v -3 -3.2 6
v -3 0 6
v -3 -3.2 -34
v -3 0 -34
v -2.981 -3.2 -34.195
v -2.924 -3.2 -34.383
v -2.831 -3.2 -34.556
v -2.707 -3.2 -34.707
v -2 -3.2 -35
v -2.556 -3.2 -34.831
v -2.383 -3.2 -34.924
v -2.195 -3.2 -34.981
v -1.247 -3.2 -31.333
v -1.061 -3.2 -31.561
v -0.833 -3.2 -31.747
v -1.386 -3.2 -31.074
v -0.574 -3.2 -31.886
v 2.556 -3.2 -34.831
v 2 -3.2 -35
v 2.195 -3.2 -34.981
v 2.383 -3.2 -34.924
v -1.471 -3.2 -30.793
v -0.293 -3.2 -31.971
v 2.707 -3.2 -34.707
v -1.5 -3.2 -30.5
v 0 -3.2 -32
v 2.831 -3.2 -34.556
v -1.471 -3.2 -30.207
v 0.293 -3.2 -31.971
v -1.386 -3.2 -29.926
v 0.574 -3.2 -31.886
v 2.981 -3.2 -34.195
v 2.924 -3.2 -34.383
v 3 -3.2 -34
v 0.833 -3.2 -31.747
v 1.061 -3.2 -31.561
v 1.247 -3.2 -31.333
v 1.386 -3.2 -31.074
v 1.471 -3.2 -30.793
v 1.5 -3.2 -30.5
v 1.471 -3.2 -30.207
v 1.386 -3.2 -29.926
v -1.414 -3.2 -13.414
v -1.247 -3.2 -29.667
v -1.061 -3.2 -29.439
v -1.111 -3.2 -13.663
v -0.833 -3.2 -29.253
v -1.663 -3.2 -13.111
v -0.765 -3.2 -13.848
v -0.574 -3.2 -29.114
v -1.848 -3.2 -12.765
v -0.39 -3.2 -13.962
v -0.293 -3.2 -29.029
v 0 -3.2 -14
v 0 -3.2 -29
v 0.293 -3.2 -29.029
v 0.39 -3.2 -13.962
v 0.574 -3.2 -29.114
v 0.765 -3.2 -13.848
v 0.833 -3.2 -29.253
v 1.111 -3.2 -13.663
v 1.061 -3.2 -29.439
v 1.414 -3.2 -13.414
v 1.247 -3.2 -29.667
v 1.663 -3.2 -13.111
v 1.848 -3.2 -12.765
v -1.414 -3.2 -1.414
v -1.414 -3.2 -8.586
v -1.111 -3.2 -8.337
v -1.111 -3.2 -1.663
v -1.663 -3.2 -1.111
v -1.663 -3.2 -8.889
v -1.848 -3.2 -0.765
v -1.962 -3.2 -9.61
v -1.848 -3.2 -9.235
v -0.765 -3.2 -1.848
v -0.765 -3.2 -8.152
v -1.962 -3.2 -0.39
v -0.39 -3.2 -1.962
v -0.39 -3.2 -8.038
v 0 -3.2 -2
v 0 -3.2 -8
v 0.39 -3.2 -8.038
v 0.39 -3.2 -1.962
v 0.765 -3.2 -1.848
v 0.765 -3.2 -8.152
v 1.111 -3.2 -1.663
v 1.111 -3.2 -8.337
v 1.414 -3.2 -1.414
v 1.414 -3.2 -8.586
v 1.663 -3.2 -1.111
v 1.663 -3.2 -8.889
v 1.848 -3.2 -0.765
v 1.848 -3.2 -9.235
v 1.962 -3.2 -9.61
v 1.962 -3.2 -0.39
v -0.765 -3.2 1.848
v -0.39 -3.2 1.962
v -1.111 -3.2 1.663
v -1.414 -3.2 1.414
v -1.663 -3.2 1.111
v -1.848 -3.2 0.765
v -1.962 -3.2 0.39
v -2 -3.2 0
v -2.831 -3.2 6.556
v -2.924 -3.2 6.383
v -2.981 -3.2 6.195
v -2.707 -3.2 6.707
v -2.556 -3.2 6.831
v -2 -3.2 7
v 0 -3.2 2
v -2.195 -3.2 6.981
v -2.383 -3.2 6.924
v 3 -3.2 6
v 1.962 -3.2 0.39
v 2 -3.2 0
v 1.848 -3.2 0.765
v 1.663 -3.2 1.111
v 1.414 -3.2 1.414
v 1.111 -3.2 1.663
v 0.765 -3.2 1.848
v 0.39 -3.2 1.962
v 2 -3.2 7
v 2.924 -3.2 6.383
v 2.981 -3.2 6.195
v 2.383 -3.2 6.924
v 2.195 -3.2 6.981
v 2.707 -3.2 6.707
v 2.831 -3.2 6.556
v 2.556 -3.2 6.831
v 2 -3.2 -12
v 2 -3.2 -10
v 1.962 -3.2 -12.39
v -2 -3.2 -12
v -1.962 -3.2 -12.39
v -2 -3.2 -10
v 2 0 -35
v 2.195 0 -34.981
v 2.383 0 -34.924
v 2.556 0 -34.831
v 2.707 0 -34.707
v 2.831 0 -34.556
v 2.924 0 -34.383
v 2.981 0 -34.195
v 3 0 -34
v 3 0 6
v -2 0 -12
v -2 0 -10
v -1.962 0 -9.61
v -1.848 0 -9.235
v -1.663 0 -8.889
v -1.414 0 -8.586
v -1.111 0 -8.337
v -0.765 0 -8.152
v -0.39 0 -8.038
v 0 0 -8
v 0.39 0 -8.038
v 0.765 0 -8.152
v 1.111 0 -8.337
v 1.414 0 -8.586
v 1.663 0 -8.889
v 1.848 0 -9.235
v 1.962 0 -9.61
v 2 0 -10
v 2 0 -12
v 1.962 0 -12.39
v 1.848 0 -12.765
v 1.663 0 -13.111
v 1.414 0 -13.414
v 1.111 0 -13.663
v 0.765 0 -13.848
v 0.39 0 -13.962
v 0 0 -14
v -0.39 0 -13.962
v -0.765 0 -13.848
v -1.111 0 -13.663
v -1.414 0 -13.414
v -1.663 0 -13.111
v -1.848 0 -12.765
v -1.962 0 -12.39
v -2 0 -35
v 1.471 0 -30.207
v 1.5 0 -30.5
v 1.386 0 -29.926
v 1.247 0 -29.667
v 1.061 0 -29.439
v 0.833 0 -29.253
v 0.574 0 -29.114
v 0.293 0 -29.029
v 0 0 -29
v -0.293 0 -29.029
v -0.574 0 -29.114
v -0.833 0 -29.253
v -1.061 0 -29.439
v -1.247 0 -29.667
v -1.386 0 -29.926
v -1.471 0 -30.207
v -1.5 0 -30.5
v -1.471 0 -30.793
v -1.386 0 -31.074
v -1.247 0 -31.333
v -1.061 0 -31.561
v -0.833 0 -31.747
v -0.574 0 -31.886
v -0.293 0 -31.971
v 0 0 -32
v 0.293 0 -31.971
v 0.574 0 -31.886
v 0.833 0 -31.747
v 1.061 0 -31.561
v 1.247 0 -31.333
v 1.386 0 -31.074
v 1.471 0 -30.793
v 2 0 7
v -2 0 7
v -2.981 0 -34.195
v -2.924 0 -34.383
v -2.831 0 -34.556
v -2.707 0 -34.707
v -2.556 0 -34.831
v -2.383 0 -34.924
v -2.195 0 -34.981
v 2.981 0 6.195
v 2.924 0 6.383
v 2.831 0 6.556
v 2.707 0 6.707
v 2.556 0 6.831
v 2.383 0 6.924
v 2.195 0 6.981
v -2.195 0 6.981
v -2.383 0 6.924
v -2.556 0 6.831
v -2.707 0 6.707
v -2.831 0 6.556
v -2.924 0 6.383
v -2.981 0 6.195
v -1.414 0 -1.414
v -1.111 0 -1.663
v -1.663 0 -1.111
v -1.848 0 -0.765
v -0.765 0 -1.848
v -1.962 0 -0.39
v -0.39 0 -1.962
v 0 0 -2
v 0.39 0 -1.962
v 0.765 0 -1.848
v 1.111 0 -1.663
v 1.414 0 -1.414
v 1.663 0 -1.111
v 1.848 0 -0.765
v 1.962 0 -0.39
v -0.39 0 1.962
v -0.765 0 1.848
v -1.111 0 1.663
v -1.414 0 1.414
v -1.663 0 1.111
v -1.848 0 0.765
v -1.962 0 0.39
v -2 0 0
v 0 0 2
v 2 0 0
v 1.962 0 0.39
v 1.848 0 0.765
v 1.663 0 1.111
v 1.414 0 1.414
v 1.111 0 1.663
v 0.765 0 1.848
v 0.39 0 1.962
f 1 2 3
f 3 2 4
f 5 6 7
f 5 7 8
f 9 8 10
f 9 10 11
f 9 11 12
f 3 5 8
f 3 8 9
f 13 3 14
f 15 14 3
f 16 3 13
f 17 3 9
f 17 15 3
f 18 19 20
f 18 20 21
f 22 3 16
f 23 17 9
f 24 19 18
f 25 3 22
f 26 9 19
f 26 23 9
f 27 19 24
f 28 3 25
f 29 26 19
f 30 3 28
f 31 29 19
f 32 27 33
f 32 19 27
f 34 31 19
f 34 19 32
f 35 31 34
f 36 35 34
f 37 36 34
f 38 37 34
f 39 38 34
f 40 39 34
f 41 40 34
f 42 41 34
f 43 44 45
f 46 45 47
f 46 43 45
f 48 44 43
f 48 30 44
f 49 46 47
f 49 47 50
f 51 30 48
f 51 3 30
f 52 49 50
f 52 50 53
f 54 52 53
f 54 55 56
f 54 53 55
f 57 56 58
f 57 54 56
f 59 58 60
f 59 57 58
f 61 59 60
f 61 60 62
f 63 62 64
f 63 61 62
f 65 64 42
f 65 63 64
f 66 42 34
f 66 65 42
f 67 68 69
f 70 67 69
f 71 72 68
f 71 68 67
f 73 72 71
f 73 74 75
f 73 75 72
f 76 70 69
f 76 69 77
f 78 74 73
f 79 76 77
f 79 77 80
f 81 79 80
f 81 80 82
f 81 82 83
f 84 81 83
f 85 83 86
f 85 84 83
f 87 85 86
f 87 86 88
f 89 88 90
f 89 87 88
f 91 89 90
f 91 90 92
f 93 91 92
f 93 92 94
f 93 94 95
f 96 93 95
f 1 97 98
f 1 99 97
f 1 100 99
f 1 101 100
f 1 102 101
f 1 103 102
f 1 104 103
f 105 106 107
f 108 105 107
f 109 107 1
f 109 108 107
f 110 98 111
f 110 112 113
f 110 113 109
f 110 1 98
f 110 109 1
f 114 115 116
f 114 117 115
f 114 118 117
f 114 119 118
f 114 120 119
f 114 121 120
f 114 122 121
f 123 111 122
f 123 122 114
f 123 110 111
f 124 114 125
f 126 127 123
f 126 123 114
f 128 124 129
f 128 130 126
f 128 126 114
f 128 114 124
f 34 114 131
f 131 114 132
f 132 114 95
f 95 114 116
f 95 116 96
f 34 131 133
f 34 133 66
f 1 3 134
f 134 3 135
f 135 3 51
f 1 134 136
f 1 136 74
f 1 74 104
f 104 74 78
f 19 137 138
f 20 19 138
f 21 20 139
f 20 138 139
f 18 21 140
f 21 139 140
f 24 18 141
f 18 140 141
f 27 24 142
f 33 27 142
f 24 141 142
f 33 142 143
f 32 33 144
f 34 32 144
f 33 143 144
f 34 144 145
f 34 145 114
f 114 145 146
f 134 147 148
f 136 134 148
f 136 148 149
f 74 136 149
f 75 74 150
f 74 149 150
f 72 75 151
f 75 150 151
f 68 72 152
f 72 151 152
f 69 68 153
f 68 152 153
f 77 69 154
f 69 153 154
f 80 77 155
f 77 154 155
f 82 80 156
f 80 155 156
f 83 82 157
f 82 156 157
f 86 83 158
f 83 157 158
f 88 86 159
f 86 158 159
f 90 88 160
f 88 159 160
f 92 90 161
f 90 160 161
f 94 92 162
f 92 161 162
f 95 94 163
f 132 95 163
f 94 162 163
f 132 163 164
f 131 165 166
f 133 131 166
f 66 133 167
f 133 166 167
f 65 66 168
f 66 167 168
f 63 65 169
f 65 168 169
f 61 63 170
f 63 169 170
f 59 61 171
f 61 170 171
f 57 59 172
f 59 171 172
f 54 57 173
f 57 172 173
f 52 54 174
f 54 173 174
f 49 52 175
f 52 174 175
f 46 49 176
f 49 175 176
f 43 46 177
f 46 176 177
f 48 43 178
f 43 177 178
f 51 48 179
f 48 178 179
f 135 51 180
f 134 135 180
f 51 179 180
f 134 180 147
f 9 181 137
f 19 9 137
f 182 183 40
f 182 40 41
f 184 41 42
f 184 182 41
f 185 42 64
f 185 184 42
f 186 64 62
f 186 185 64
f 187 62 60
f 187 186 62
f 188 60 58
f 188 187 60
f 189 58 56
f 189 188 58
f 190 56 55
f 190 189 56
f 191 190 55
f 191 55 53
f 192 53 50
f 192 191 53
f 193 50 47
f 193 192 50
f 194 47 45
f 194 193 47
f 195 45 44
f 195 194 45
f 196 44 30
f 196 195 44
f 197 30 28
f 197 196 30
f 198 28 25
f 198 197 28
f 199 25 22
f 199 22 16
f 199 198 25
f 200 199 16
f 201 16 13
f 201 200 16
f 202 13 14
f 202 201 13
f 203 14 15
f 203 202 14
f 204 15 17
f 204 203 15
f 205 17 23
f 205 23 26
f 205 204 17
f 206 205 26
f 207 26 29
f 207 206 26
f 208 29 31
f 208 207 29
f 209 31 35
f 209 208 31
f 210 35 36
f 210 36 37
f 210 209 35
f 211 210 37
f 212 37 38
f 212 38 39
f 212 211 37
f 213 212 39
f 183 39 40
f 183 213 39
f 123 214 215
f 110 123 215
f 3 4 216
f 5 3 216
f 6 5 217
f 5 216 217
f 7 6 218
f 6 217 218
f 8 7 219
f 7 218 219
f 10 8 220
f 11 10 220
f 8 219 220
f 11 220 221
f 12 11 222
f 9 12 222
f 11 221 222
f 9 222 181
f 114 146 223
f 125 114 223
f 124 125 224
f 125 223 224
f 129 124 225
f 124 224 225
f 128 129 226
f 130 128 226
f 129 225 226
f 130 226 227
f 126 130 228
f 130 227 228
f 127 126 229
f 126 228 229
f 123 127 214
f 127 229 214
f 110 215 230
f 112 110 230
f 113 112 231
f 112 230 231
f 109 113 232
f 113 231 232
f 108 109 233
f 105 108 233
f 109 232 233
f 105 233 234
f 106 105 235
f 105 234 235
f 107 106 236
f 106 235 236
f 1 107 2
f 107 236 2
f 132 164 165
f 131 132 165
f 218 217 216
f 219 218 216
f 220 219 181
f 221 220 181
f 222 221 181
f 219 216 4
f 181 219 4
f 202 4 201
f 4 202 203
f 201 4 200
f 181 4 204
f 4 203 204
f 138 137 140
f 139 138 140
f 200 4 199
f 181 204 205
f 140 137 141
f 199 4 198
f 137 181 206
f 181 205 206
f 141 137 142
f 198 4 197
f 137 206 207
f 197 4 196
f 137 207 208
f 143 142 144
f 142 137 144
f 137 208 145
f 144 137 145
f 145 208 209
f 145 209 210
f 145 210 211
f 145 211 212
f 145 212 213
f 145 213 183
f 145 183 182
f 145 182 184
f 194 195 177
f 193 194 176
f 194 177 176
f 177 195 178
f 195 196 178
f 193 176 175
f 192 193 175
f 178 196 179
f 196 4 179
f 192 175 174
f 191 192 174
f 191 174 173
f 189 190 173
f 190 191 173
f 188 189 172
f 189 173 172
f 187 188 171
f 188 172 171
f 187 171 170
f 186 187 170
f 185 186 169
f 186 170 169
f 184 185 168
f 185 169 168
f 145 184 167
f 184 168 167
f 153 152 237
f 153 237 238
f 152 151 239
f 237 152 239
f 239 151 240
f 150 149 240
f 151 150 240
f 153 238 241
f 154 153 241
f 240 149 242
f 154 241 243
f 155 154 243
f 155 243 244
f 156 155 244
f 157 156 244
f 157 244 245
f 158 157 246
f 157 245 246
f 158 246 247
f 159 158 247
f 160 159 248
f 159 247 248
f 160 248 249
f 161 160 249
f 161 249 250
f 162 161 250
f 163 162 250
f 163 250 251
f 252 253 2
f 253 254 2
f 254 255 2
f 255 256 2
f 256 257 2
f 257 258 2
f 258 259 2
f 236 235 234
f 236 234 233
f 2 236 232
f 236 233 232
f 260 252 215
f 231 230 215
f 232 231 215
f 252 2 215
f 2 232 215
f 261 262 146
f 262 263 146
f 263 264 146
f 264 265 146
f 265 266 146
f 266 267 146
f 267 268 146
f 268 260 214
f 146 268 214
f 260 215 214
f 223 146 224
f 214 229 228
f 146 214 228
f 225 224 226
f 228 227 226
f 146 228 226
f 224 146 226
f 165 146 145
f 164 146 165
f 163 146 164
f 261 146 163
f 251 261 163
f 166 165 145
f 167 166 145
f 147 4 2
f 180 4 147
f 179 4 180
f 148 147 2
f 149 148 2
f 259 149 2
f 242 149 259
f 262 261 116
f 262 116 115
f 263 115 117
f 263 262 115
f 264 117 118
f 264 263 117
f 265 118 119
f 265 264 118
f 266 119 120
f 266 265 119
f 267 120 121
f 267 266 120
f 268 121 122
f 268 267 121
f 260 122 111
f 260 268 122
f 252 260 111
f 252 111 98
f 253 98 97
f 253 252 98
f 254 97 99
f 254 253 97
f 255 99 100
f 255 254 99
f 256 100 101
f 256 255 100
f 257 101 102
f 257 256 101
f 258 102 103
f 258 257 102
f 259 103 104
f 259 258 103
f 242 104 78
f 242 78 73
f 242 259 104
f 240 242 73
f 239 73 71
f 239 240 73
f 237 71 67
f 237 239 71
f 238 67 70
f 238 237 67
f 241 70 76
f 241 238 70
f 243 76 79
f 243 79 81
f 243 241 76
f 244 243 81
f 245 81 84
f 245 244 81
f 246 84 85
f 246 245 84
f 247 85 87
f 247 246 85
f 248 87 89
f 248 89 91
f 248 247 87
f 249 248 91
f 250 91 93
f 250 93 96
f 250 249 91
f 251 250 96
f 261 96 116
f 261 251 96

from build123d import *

# Parameters (mm, degrees)
F0_R     = 1.5
F0_R_2   = 2
F1_DEPTH = 3.2


with BuildPart() as f1:
    # F0 (on Front) → F1 (new body)
    with BuildSketch(Plane.XZ):
        with BuildLine():
            Line((3, -34), (3, 6))
            ThreePointArc((3, 6), (2.707107, 6.707107), (2, 7))
            Line((2, 7), (-2, 7))
            ThreePointArc((-2, 7), (-2.707107, 6.707107), (-3, 6))
            Line((-3, 6), (-3, -34))
            ThreePointArc((-3, -34), (-2.707107, -34.707107), (-2, -35))
            Line((-2, -35), (2, -35))
            ThreePointArc((2, -35), (2.707107, -34.707107), (3, -34))
        make_face()
        with Locations((0, -30.5)):
            Circle(F0_R, mode=Mode.SUBTRACT)
        with BuildLine():
            ThreePointArc((-2, -10), (0, -8), (2, -10))
            Line((2, -10), (2, -12))
            ThreePointArc((2, -12), (0, -14), (-2, -12))
            Line((-2, -12), (-2, -10))
        make_face(mode=Mode.SUBTRACT)
        Circle(F0_R_2, mode=Mode.SUBTRACT)
    extrude(amount=F1_DEPTH)


solid = f1.part
